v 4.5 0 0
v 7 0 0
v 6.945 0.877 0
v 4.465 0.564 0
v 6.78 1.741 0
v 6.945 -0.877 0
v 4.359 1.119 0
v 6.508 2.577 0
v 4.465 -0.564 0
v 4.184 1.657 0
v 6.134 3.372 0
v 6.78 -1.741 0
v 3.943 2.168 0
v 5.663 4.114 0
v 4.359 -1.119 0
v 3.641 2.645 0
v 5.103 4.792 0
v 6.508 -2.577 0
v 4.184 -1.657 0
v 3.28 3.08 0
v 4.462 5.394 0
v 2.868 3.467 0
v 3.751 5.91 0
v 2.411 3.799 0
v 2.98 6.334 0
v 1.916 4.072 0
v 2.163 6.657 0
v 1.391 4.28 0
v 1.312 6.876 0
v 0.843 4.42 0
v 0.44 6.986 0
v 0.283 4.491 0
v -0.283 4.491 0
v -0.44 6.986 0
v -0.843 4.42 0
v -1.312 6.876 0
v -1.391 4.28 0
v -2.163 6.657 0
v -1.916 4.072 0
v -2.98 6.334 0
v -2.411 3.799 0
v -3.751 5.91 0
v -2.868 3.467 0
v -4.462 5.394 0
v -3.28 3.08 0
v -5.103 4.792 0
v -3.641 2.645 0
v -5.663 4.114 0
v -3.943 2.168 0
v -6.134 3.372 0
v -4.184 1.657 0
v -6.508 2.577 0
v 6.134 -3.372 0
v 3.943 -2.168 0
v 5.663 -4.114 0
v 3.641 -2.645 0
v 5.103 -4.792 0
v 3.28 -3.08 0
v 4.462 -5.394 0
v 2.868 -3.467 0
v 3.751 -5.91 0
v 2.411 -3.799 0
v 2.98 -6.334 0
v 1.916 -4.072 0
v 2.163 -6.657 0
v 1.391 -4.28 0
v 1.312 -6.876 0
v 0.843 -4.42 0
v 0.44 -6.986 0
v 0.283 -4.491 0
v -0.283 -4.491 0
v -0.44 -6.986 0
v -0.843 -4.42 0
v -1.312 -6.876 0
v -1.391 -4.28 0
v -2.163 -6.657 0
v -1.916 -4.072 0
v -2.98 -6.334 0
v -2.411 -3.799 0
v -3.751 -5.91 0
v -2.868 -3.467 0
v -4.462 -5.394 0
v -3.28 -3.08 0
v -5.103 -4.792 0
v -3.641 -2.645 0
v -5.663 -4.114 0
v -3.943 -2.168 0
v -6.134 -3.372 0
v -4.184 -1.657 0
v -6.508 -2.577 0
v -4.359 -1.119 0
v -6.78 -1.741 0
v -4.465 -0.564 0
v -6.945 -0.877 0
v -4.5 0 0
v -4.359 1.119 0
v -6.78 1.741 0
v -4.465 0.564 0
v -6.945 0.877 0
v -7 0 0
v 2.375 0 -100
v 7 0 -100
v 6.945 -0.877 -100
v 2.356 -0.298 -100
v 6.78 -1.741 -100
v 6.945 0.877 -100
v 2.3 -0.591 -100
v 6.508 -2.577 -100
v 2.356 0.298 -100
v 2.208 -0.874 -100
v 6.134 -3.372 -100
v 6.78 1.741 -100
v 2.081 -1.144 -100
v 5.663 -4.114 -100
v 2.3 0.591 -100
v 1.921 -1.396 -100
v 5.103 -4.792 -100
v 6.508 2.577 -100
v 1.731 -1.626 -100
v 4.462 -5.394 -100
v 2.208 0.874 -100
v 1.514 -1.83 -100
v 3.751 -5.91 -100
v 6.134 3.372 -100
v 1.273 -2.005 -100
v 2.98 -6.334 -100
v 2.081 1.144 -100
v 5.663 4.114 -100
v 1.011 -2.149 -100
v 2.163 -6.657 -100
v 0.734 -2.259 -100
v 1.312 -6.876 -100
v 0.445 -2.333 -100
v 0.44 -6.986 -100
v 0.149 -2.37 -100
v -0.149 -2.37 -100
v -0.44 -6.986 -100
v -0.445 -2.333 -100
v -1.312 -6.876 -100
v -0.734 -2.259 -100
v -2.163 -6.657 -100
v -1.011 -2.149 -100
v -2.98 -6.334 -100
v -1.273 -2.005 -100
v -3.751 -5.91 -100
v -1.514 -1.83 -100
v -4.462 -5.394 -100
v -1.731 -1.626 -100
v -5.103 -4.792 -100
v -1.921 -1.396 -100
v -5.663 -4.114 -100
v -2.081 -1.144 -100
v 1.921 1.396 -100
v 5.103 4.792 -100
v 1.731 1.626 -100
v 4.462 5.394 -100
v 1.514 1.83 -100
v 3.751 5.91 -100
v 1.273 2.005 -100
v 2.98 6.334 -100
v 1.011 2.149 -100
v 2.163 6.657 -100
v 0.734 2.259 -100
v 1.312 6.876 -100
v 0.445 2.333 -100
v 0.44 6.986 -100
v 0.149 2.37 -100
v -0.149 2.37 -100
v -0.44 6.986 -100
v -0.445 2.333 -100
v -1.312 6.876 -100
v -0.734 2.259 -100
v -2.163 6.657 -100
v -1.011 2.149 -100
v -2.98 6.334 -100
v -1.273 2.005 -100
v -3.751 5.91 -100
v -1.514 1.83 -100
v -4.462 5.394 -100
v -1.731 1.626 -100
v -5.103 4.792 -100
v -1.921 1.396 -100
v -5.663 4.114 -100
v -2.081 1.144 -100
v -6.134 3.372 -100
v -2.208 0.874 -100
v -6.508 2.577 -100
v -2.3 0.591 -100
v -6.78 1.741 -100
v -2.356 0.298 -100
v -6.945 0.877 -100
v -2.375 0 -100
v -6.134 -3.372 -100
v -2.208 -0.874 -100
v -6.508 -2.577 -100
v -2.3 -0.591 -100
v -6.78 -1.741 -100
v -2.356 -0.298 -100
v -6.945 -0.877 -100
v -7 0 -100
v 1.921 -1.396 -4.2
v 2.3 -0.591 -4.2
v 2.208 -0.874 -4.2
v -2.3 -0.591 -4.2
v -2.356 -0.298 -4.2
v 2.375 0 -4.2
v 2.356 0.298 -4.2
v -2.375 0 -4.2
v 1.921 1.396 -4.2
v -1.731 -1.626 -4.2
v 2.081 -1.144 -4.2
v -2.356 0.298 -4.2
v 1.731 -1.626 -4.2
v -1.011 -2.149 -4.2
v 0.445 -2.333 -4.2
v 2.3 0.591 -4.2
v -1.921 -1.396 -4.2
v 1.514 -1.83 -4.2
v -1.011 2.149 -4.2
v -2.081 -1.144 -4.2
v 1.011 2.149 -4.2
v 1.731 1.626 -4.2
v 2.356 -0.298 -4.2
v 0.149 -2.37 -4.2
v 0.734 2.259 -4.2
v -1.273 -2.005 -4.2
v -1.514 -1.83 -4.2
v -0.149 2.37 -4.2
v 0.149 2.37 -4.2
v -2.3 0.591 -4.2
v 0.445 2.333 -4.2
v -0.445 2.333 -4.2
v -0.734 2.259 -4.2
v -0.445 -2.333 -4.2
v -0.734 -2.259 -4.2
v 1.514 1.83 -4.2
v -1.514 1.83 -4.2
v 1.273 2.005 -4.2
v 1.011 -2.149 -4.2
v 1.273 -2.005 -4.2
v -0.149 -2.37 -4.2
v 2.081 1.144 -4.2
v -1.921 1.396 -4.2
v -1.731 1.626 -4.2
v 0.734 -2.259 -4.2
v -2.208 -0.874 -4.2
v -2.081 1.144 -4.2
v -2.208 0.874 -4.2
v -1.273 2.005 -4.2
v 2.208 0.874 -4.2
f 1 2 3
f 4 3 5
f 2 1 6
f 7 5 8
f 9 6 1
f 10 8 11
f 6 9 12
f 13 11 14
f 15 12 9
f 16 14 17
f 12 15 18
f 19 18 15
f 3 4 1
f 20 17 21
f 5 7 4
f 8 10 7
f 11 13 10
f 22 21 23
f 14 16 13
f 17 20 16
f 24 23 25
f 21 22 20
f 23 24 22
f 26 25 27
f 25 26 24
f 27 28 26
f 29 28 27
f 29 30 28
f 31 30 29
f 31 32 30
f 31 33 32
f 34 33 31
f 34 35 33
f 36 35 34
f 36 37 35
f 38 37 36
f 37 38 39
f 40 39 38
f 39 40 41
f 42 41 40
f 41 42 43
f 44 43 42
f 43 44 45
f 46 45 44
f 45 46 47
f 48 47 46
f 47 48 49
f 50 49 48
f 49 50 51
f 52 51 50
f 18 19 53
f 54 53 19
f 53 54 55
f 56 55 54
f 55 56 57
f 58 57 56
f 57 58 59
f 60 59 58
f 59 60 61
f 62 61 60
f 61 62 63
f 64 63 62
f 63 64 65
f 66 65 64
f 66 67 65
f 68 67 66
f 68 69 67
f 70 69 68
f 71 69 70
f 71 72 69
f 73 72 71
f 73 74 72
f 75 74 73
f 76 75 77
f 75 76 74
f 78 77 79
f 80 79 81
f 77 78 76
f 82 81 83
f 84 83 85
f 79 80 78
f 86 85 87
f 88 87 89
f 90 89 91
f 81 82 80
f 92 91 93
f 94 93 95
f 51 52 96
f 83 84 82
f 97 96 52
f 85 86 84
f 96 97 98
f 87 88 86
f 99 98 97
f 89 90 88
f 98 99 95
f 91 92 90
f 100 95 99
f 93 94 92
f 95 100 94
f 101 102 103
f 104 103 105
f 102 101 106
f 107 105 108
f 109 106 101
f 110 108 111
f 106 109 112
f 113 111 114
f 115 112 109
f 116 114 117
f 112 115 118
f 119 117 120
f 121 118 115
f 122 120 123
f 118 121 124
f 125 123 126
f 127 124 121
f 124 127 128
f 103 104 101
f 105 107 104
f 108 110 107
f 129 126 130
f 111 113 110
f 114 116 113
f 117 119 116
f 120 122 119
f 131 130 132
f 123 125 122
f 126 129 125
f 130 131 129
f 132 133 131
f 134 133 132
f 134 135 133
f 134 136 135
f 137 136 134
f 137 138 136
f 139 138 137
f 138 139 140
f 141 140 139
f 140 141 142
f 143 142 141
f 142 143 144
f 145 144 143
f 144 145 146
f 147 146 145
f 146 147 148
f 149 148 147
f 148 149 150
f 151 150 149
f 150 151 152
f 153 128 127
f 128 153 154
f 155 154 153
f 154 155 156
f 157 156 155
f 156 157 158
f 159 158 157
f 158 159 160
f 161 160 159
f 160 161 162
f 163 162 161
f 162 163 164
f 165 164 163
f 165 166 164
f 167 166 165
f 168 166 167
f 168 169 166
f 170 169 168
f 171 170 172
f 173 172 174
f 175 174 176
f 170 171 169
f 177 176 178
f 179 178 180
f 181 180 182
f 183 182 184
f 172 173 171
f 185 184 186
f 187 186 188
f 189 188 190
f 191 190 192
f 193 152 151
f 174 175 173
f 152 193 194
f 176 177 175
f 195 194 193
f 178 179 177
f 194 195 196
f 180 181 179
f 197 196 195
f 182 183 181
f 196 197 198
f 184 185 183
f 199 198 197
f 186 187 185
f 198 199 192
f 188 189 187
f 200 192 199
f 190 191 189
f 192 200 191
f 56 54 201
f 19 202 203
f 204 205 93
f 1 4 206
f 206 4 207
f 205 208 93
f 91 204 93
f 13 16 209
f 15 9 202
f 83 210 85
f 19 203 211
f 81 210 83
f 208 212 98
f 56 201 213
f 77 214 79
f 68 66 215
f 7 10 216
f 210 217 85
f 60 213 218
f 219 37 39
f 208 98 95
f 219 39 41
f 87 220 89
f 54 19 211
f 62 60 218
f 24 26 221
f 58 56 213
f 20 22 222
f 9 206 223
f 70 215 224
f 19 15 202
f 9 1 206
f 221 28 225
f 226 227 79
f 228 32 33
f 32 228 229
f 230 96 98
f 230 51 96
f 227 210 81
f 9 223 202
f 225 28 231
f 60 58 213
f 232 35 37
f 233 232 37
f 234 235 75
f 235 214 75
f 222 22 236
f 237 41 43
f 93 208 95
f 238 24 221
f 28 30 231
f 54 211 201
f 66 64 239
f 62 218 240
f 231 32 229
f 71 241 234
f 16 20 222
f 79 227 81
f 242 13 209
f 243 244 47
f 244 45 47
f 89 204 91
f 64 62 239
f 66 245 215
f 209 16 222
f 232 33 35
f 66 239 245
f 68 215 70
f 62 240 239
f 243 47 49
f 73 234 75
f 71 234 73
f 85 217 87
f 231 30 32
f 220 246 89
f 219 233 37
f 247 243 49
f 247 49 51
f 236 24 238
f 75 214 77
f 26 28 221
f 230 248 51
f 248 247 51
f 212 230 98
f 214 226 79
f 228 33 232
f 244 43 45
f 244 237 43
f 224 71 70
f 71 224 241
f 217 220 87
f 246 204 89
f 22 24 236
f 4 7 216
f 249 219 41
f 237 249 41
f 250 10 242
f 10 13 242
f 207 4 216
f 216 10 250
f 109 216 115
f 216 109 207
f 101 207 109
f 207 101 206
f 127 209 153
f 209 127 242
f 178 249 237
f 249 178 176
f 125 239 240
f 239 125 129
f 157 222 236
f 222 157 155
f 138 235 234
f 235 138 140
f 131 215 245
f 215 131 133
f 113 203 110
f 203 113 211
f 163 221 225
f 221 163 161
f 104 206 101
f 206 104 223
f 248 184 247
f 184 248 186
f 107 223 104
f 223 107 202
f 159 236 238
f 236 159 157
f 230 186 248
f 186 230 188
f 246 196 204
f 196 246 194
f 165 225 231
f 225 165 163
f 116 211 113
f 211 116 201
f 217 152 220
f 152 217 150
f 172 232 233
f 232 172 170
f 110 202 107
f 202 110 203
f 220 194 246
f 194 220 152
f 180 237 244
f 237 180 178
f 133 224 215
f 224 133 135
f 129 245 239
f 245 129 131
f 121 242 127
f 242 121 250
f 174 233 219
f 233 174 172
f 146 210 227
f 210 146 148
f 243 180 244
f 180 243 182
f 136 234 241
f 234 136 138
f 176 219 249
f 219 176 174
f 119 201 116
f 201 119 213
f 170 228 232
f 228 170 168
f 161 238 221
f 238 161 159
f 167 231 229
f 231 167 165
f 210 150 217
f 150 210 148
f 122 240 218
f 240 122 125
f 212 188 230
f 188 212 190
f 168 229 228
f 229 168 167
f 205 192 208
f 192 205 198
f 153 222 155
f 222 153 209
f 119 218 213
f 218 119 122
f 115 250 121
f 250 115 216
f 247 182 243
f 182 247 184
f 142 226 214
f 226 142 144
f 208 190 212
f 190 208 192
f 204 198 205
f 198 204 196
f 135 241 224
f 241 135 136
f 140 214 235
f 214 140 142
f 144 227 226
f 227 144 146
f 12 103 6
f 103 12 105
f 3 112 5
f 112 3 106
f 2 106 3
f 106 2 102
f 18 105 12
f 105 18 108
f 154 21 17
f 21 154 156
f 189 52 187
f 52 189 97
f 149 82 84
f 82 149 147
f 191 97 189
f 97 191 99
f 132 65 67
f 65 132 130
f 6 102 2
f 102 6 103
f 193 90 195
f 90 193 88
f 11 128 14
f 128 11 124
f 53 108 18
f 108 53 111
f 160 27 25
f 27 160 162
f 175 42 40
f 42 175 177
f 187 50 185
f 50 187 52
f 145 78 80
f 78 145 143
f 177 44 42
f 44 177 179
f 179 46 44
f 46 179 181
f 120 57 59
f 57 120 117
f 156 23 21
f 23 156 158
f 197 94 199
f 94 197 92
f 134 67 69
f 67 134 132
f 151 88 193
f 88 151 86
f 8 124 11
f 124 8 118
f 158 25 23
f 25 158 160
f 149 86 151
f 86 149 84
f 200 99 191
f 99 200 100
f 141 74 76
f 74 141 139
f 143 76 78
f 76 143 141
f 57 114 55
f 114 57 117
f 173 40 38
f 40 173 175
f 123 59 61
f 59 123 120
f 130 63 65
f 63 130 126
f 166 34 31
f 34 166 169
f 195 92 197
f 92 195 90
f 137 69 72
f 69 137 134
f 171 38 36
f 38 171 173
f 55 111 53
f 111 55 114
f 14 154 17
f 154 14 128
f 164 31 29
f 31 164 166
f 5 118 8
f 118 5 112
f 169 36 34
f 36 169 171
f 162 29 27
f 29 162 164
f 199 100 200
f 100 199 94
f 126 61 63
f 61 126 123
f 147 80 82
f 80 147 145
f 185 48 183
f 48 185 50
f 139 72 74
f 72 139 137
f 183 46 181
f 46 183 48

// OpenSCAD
$fn = 50;


difference() {
	union() {
		translate(v = [0, 0, -100.0000000000]) {
			cylinder(h = 100, r = 7.0000000000);
		}
		cylinder(h = 0, r = 10.0000000000);
	}
	union() {
		translate(v = [0, 0, 0]) {
			rotate(a = [0, 0, 0]) {
				difference() {
					union() {
						#translate(v = [0, 0, -100.0000000000]) {
							cylinder(h = 100, r = 2.2500000000);
						}
						#translate(v = [0, 0, -4.2000000000]) {
							cylinder(h = 4.2000000000, r1 = 2.3750000000, r2 = 4.5000000000);
						}
						#translate(v = [0, 0, -100.0000000000]) {
							cylinder(h = 100, r = 2.3750000000);
						}
						#translate(v = [0, 0, -100.0000000000]) {
							cylinder(h = 100, r = 2.2500000000);
						}
					}
					union();
				}
			}
		}
	}
}
